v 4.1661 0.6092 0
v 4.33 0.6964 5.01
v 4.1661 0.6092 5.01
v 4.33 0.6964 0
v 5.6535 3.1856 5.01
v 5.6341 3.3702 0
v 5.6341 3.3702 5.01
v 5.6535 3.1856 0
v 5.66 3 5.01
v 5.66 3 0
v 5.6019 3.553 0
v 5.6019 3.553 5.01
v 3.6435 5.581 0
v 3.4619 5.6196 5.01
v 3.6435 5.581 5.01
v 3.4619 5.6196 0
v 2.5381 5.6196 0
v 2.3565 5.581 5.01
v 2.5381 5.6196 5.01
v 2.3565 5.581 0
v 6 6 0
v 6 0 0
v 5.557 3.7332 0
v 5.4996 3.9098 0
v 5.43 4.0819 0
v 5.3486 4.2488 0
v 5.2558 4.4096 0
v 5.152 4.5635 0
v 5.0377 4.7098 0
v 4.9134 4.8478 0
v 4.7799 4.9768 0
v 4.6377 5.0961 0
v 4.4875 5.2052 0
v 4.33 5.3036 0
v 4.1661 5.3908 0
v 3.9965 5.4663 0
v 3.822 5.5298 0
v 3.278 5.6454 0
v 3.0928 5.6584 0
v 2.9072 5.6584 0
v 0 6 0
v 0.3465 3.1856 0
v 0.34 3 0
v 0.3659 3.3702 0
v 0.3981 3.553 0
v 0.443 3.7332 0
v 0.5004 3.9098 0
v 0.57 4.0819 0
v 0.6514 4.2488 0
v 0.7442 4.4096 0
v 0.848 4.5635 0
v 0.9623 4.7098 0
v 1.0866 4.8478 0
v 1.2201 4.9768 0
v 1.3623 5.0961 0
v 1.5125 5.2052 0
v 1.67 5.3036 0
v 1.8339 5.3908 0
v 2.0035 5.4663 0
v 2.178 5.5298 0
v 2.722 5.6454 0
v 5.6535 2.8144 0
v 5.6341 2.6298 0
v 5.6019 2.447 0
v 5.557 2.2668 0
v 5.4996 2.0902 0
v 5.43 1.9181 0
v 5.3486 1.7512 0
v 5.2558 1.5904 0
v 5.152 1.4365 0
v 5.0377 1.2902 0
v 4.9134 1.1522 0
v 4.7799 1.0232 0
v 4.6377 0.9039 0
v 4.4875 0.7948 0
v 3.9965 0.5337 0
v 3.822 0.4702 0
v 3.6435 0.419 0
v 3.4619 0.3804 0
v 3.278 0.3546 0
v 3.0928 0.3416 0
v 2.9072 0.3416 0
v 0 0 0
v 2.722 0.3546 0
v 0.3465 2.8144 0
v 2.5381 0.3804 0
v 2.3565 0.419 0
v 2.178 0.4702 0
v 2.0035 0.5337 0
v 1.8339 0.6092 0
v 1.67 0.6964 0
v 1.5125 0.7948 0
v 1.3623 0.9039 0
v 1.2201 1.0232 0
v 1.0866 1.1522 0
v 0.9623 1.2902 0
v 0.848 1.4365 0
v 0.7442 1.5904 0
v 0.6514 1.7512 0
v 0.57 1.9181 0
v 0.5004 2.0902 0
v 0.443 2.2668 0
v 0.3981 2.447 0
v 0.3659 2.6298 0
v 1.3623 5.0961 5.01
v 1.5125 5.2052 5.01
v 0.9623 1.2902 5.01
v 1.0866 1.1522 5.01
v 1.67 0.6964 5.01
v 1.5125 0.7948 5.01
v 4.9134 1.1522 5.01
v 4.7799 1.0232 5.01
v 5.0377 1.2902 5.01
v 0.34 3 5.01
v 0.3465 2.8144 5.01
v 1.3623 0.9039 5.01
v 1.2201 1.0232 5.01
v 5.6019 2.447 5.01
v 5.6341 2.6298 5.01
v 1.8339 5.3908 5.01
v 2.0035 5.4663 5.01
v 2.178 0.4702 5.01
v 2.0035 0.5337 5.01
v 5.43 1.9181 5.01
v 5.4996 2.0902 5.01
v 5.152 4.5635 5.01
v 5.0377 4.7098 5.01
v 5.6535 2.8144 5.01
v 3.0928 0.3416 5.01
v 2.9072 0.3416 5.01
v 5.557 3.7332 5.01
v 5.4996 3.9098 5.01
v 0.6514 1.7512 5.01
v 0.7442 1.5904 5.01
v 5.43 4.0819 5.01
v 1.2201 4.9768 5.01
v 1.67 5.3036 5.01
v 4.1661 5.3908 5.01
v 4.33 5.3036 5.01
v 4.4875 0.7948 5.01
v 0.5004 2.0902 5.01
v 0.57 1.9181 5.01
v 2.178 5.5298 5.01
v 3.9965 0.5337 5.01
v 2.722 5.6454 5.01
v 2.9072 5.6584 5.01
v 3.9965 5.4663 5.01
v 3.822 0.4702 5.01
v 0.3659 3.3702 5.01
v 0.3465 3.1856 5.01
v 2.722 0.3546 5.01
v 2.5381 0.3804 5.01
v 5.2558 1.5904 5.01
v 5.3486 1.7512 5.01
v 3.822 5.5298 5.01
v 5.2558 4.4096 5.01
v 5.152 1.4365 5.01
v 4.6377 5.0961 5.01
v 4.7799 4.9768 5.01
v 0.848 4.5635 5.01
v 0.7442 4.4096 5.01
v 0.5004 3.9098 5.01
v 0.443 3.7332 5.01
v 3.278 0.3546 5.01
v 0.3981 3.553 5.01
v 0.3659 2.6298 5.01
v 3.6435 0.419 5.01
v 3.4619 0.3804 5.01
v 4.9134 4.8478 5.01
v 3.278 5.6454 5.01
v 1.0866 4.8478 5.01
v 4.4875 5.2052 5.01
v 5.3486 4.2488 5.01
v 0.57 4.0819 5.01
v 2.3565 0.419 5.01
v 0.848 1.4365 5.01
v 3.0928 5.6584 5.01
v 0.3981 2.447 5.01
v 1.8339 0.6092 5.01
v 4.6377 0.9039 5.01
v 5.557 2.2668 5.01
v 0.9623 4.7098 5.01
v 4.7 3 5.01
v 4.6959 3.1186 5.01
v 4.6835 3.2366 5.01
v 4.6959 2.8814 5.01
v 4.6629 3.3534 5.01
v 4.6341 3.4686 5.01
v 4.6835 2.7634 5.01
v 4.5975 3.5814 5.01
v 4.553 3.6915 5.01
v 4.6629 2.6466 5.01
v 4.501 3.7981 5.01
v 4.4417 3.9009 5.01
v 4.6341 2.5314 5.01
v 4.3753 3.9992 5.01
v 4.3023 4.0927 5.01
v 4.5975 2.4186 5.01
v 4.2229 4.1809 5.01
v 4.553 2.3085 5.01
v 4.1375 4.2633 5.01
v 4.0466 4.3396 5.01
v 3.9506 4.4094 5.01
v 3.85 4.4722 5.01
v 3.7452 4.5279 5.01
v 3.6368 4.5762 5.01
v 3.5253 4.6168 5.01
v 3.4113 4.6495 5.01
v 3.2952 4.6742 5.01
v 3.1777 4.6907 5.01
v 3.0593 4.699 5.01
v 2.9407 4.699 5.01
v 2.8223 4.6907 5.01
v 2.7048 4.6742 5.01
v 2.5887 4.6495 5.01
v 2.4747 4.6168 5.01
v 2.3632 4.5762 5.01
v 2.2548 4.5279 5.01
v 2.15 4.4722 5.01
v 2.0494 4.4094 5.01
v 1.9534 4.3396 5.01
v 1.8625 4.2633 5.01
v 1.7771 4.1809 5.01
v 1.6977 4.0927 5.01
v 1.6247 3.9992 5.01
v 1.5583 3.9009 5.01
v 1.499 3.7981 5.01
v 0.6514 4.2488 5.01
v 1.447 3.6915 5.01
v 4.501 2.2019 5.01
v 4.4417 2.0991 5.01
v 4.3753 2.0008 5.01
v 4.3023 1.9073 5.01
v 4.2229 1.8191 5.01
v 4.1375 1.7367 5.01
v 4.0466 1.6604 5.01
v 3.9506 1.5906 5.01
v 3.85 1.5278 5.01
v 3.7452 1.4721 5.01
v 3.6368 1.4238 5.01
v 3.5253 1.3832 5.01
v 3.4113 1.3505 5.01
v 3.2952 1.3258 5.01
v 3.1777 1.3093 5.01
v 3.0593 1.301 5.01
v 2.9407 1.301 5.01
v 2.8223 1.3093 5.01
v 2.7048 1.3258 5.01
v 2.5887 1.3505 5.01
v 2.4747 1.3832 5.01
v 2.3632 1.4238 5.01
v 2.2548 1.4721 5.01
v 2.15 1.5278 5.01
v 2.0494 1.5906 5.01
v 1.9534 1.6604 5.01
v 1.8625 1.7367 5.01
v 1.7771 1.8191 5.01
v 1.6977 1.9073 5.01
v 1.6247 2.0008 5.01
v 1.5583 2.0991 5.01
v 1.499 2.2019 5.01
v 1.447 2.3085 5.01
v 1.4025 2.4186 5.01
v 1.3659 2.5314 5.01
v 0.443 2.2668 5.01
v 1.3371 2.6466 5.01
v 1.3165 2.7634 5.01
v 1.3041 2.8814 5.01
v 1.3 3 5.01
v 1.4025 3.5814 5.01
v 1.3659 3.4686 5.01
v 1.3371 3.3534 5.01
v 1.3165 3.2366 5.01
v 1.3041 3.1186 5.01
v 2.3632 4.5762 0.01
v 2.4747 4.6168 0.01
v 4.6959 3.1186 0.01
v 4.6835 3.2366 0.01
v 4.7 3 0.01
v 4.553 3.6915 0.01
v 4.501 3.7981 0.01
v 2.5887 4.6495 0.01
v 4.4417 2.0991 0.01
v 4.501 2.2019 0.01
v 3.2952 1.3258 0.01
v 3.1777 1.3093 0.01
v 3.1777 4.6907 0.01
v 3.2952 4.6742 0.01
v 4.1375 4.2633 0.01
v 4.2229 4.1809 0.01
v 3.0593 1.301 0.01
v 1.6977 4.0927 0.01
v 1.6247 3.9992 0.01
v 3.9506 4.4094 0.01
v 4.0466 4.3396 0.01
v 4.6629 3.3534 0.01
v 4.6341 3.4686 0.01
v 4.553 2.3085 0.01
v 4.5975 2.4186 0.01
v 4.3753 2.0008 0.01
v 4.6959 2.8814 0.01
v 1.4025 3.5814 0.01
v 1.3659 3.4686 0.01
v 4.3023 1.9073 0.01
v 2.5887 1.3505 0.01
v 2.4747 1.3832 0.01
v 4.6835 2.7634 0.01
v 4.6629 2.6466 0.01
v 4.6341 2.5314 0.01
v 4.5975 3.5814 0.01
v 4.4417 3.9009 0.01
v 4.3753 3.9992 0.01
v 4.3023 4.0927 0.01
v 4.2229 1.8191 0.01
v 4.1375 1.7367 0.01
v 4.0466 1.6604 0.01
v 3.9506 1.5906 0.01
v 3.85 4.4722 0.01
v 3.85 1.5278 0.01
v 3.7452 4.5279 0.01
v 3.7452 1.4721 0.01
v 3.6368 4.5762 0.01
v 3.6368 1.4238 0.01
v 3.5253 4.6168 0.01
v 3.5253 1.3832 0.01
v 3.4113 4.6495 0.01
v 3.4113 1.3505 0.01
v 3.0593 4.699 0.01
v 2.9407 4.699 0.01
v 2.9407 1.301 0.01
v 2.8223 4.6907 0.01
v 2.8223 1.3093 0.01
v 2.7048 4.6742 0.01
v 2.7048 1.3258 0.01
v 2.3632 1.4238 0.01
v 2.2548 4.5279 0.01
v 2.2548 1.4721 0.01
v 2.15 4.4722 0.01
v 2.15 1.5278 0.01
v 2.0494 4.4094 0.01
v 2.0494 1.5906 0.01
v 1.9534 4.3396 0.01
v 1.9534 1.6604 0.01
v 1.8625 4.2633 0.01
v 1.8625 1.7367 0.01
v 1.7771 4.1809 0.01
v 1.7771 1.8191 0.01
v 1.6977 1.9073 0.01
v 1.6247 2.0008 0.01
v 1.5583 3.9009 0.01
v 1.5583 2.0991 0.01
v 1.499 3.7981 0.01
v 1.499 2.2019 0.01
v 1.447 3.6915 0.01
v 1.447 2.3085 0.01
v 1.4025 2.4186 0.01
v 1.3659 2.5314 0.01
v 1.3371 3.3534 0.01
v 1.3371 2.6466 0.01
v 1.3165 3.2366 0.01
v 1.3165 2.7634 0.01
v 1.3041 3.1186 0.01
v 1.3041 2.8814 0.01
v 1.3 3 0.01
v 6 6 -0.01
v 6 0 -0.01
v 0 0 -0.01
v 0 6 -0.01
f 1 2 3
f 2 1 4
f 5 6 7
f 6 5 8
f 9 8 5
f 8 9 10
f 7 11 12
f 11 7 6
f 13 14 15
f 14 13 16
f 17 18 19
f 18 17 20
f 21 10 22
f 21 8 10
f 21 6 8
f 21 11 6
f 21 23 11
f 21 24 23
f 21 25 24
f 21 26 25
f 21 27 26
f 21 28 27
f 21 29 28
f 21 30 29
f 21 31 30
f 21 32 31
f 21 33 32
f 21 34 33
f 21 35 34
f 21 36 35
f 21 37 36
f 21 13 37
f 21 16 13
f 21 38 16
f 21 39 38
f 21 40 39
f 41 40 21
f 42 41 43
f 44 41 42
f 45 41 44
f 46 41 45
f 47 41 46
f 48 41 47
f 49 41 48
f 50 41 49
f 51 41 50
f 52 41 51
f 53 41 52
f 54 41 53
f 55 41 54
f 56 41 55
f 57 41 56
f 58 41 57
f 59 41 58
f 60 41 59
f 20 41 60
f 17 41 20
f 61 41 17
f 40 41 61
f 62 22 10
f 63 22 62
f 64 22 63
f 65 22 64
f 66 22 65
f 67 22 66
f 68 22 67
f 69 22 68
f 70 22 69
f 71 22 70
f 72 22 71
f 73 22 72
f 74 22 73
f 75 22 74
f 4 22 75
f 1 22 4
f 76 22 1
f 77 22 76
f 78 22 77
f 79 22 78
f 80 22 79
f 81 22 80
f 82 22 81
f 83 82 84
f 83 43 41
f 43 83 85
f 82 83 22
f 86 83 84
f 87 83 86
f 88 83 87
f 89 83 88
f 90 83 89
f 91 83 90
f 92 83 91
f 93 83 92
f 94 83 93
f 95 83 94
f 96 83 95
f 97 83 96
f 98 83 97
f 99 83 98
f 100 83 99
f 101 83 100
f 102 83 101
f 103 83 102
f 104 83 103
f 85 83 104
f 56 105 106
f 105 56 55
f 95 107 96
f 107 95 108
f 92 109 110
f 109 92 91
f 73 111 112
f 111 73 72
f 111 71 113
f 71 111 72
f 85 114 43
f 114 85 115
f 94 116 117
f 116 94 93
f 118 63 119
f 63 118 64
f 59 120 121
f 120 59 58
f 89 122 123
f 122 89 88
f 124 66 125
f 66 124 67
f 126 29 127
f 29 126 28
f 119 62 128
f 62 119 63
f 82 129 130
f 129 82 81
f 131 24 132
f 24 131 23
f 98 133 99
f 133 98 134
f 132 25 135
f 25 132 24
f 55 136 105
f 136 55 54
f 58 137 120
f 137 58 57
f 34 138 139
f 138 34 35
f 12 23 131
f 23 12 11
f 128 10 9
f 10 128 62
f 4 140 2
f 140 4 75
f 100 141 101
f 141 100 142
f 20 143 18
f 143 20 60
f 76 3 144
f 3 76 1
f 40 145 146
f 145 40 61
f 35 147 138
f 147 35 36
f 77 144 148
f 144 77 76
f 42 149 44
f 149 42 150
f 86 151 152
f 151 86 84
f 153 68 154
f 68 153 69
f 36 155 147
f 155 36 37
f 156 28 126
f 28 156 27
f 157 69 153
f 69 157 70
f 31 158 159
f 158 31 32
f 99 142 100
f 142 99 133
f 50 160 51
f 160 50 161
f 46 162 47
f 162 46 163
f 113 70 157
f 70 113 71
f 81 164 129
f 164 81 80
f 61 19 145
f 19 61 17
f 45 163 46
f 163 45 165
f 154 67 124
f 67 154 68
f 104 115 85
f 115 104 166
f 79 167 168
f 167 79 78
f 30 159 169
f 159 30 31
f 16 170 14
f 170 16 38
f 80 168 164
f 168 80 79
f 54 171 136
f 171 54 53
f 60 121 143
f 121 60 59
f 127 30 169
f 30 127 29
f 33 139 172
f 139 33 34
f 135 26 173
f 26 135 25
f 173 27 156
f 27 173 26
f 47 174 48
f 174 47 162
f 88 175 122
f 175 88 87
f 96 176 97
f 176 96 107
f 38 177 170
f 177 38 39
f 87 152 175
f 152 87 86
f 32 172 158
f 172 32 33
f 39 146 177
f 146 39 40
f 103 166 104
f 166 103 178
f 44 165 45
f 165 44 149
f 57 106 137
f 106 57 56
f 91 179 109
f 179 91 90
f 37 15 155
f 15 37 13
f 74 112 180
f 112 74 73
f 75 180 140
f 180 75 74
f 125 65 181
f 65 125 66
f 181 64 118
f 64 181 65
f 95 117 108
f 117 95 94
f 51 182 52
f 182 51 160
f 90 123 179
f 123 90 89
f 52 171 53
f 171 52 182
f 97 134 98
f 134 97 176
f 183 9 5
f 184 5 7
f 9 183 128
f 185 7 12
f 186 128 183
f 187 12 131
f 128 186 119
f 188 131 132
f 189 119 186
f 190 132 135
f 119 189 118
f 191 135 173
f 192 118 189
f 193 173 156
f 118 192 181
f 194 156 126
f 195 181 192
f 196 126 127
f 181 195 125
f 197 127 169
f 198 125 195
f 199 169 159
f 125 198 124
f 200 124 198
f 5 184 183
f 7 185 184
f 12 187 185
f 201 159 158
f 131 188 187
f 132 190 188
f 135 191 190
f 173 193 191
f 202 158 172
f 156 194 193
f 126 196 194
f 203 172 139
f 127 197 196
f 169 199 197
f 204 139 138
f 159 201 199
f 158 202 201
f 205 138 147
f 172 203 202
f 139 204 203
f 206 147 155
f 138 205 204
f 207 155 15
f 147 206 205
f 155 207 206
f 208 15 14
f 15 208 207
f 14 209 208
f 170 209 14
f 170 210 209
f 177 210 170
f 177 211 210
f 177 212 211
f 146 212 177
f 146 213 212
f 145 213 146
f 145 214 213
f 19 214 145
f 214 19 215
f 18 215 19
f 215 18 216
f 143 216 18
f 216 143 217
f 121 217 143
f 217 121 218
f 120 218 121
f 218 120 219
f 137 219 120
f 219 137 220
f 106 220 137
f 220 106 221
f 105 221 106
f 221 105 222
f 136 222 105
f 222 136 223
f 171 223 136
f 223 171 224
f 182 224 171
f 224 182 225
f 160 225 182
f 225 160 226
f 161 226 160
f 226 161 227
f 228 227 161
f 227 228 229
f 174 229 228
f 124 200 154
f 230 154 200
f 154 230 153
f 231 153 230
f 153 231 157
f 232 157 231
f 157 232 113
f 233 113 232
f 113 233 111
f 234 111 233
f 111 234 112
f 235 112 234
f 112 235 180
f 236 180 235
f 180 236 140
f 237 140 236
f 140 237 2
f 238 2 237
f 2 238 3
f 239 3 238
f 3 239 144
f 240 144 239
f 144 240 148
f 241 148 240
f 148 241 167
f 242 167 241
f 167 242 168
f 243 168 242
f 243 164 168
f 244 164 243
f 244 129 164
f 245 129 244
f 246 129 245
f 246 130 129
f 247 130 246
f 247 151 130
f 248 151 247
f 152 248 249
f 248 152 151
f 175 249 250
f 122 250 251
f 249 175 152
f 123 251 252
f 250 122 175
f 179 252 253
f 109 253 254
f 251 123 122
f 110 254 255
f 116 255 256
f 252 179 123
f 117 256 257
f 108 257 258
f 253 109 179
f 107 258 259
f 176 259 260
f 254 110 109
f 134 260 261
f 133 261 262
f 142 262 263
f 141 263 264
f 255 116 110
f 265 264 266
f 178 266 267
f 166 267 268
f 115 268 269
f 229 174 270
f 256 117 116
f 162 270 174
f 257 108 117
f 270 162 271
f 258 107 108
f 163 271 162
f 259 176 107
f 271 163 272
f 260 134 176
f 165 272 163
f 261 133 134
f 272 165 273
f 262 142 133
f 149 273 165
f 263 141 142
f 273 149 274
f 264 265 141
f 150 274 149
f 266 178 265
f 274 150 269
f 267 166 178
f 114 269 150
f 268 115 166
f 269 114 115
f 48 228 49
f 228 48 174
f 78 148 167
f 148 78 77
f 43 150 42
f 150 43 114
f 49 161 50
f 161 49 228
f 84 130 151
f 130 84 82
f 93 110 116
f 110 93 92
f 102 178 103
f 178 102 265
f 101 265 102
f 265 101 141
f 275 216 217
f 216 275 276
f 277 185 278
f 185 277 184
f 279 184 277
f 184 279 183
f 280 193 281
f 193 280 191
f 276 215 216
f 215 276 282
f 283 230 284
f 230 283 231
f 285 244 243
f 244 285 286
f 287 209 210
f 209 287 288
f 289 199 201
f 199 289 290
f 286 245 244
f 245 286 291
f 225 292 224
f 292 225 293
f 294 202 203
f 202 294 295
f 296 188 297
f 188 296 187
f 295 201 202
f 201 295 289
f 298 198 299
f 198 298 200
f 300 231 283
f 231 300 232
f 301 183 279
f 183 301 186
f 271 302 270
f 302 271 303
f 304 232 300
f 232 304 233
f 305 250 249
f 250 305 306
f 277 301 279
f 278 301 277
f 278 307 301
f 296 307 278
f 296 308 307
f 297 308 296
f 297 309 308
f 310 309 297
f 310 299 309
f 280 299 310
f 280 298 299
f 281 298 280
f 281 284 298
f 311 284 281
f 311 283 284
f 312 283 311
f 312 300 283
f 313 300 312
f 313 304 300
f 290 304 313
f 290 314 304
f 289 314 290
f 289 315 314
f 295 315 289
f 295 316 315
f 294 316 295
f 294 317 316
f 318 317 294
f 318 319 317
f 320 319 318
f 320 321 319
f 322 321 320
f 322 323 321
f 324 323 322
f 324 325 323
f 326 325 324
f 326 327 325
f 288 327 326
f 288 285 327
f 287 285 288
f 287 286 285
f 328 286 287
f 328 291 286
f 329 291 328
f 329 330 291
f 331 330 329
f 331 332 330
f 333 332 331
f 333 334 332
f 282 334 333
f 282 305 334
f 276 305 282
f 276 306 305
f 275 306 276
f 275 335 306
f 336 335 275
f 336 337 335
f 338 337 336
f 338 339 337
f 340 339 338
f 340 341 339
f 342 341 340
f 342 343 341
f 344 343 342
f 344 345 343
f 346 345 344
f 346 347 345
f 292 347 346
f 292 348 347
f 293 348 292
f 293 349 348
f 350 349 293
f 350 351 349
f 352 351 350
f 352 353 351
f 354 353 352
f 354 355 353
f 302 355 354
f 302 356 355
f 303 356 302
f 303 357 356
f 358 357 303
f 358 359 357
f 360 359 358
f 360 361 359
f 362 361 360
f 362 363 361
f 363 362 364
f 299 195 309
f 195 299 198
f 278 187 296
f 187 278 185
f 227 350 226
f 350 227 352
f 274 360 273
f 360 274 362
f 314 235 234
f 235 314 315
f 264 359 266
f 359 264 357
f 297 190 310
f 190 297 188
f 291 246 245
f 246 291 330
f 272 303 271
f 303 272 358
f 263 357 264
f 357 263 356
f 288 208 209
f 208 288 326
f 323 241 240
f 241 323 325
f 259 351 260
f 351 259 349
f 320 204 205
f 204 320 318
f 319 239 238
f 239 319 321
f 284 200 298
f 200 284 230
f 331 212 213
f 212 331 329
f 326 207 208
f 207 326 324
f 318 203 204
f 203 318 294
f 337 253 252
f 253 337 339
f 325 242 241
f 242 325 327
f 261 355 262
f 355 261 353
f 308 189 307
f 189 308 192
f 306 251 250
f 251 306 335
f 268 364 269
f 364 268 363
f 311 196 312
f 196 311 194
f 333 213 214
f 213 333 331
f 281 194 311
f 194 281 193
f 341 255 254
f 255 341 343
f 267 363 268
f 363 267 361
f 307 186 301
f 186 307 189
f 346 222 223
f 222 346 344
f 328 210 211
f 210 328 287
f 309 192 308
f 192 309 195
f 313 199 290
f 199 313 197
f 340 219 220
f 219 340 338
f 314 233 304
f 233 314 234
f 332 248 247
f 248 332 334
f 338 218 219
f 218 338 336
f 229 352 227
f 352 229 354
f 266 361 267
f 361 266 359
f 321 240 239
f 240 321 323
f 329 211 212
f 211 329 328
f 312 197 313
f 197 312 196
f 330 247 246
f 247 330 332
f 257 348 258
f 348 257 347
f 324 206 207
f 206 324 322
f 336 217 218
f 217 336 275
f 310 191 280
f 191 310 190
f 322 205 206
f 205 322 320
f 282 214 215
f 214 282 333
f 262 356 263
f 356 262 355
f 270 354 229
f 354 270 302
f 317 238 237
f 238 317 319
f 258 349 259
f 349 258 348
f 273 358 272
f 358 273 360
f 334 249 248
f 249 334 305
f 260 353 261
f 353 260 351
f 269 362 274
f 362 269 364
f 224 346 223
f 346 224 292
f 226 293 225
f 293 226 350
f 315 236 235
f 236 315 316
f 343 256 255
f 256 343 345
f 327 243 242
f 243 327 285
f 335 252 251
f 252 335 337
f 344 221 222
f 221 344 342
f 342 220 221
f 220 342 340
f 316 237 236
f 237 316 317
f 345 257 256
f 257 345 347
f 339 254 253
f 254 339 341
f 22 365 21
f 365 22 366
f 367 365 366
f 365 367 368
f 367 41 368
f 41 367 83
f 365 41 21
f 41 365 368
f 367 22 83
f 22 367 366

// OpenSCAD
// file: ../Base/PlacementOptions.scad
// Fischertechnik Box Foundation
// Placement Options

// Alignment
NoAlign = 0;
AlignLeft = 1;
AlignBottom = 2;
AlignCenter = 3;
AlignRight = 4;
AlignTop = 5;

// Element rotation degree steps
rotations = [0, -90, -180, -270];

// Rotation
NoRotation = 0;
Rotate0 = 0;
Rotate90 = 1;
Rotate180 = 2;
Rotate270 = 3;

// Docking (seen from above)
NoDock = -1;
DockLeft = 0;
DockTop = 1;
DockRight = 2;
DockCorner = 2;
DockBottom = 3;

// Web corners
LowerLeft = 0;
UpperLeft = 1;
UpperRight = 2;
LowerRight = 3;

// Web position relative to corner
LeftOfCorner = 0;
RightOfCorner = 1;
// file: ../Base/Boxes.scad
// Fischertechnik Box Foundation
// Pre-designed Boxes

use <Constants.scad>

include <PlacementOptions.scad>

box190Width = 190;
box190Depth = 130;
box130Width = 130;
box130Depth = 95;

// Values are from an original ec3 box
topBottomDifference = 1.5;
outerHeight = 40;
baseThickness = 1.8;
innerHeight = outerHeight - baseThickness;
stackExcess = 5.7;
radius = 3.5;
wallThickness = 1.5;
tolerance = 0.2;

boxWallThickness = wallThickness;
boxBaseThickness = baseThickness;
boxWebWidth = 3.0;

// getBoxWallThickness()
// Gets the wall thickness of a Fischertechnik Box
function getBoxWallThickness() = boxWallThickness;

// getBoxUsageHeight(height = 38.2)
// Gets the usable height of a Fischertechnik box
// height = Outer height of the box from the bottom to the upper edge.
function getBoxUsageHeight(height = outerHeight) = height - baseThickness - stackExcess;

// getBoxInnerHeight()
// Gets the inner height of a Fischertechnik box, including the stack excess
function getBoxInnerHeight() = innerHeight;

// getBoxBaseThickness()
// Gets the thickness of the Fischertechnik box base.
function getBoxBaseThickness() = boxBaseThickness;

// getBoxWebWidth()
// Gets the width of a box web
function getBoxWebWidth() = boxWebWidth;

// getBox190Space()
// Gets the usable inner space of a Box 190 as an x/y-list
function getBox190Space() = [
    box190Width - 2*getBoxWallThickness() - topBottomDifference, 
    box190Depth - 2*getBoxWallThickness() - topBottomDifference ];

// RoundedCornerPlate(width, depth, height, radius)
// Creates a body plate with rounded corners for a box. Used
// also to create the complete box with the hull module.
// width = Width of the plate
// depth = depth of the plate 
// height = thickness of the plate
// radius = radius of the rounded corner
module RoundedCornerPlate(width, depth, height, radius) {
    translate([radius, radius])
    hull() {
        w = width-2*radius;
        d = depth-2*radius;
        cube([w, d, height]);
        cylinder(height, r=radius, $fn=getFragments());
        translate([w, 0])
            cylinder(height, r=radius, $fn=getFragments());
        translate([w, d])
            cylinder(height, r=radius, $fn=getFragments());
        translate([0, d])
            cylinder(height, r=radius, $fn=getFragments());
    }
}

// BoxBase(width, depth)
// Creates an empty stackable Fischertechnik compatible box
// width = Outer width of the box (190, 130, ...)
// depth = Outer depth of the box (130, 95, ...)

module BoxBase(width, depth, height=outerHeight) {    
    thinPlate = 0.01;

    innerHeight = height - baseThickness;    
    
    module Body(tolerance=tolerance) {
        hull() {
            // Bottom with tolerance to fit into the original boxes when stacked
            translate([-wallThickness+tolerance, -wallThickness+tolerance, -baseThickness])
                RoundedCornerPlate(width-topBottomDifference-2*tolerance, depth-topBottomDifference-2*tolerance, thinPlate, radius);
            
            // Top
            translate([-wallThickness-topBottomDifference/2, -wallThickness-topBottomDifference/2, innerHeight-thinPlate])
                RoundedCornerPlate(width, depth, thinPlate, radius);
         }
    }

    module Cutoff() {
        hull() {
            coWidth = width - 2*wallThickness;
            coDepth = depth - 2*wallThickness;
            
            // Bottom
            RoundedCornerPlate(coWidth-topBottomDifference, coDepth-topBottomDifference, thinPlate, radius);

            // Top
            translate([-topBottomDifference/2, -topBottomDifference/2, innerHeight+thinPlate]) 
                RoundedCornerPlate(coWidth, coDepth, thinPlate, radius);
        }
    }
    
    difference() {        
        Body();
        Cutoff();
        stackOffset = innerHeight - stackExcess;
        translate([0, 0, stackOffset + baseThickness])
            Body(tolerance=0);
    }
}

// Creates the Fischertechnik empty box 130x190 mm and places it at position 0,0
// 190x130 are the outer sizes, the inner space is slightly smaller. Use getBox190Space() to get the inner sizes.
// The box is positioned that the usable inner space is at the 0,0,0 position.

module Box190() {
    BoxBase(box190Width, box190Depth);
}

// Gets the usable inner space of a Box 130 as an x/y-list
function getBox130Space() = [
    box130Width - 2*getBoxWallThickness() - topBottomDifference, 
    box130Depth - 2*getBoxWallThickness() - topBottomDifference ];

// Creates the Fischertechnik empty box 95x130 mm and places it at position 0,0
// 190x130 are the outer sizes, the inner space is slightly smaller. Use getBox190Space() to get the inner sizes.
// The box is positioned that the usable inner space is at the 0,0,0 position.

module Box130() {
    BoxBase(box130Width, box130Depth);
}

// Creates a web at the specified box walls
// corner 0 = LowerLeft, 1 = UpperLeft, 2 = UpperRight, 3 = LowerRight
// side 0 = LeftOfCorner, 1 = RightOfCorner
// distance = Distance in mm from the corner
// boxSpace = inner width and depth of the box (default: Box 190)
// webWidth = length of the web (default is 3 mms)
// webThickness = thickness of the web (default is 1 mm)
// height = Height of the web (standard is getBoxUsageHeight())
// sink = How much of the web is sunk into the wall

module BoxWeb(
    corner, 
    side, 
    distance, 
    boxSpace=getBox190Space(), 
    webWidth=getBoxWebWidth(), 
    webThickness=1.0, 
    height=getBoxUsageHeight(),
    sink = getBoxWallThickness()/2) {
    width = (corner % 2 == 0) ? 
            (side == LeftOfCorner ? webWidth : webThickness) :
            (side == LeftOfCorner ? webThickness : webWidth);

    depth = (corner % 2 == 0) ? 
            (side == RightOfCorner ? webWidth : webThickness) :
            (side == RightOfCorner ? webThickness : webWidth);
    
    xDiff = corner == LowerLeft ? 
                (side == LeftOfCorner ? -sink : distance) :
            (corner == UpperLeft ?                
                (side == LeftOfCorner ? distance : -sink) :
            (corner == UpperRight ?
                (side == LeftOfCorner ? boxSpace.x-webWidth+sink : boxSpace.x-distance-webThickness) :
                (side == LeftOfCorner ? boxSpace.x-distance-webThickness: boxSpace.x-webWidth+sink)));

    yDiff = corner == LowerLeft ? 
                (side == RightOfCorner ? -sink : distance) :
            (corner == UpperLeft ?
                (side == RightOfCorner ? boxSpace.y-distance-webThickness : boxSpace.y-webWidth+sink) :
            (corner == UpperRight ?
                (side == RightOfCorner ? boxSpace.y-webWidth+sink : boxSpace.y-distance-webThickness) :
                (side == RightOfCorner ? distance : -sink)));
    
    translate([xDiff, yDiff, -getExcess()])
        cube([width, depth, height + 2*getExcess()]);
}
// file: ../Base/Rotation.scad
// Fischertechnik Box Foundation
// Geometry Helpers Rotation

include <PlacementOptions.scad>

// getRotatedSpace(space, rotation=NoRotation)
// Rotates the space dependent on the specified rotation

function getRotatedSpace(space, rotation=NoRotation) = [
    (rotation == Rotate90 || rotation == Rotate270) ? space.y : space.x,
    (rotation == Rotate90 || rotation == Rotate270) ? space.x : space.y
];

// Rotates the given space around the fixed left lower corner
// space = the space the children needs as width/depth list [width,depth]
// rotation = 0 Rotate0 degrees, 1 Rotate90 degrees, 2 Rotate180 degrees, 3 Rotate270 degrees (equivalent to -90)

module RotateFix(space, rotation=NoRotation) {
    dy = (rotation == Rotate0 || rotation == Rotate270) ? 0 :
        (rotation == Rotate90) ? space.x :
        space.y;
    dx = (rotation < Rotate180) ? 0 :
        (rotation == Rotate180) ? space.x :
        space.y;
    
    translate([dx, dy, 0])
        rotate([0, 0, rotations[rotation]])
            children();
}
// file: ../Base/Alignment.scad
// Fischertechnik Box Foundation
// Geometry Helpers Alignment

include <PlacementOptions.scad>

// getAlignedX(elementWidth, spaceWidth, align=AlignRight, offset=0)
// Gets the aligned X offset of an element with the given
// width in the given space.
// elementWidth = The width of the element to positon
// spaceWidth = The space where the element should be aligned
// align = 0 AlignLeft, 1 AlignCenter, 2 AlignRight
// offset = an optional offset from the aligned position. When
// aligned left or centered, then positive values are in X direction.
// When aligned right then positive values are in negative X direction.

function getAlignedX(elementWidth, spaceWidth, align=AlignRight, offset=0) =
    (align == AlignLeft) ?
        offset :
        ((align == AlignCenter) ?
        (spaceWidth - elementWidth)/2 + offset :
        spaceWidth - offset - elementWidth);

// getAlignedY(elementDepth, spaceDepth, align=AlignTop, offset=0)
// Gets the aligned Y offset of an element with the given
// depth in the given space.
// elementDepth = The depth of the element to positon
// spaceDepth = The space where the element should be aligned
// align = 0 AlignBottom, 1 AlignCenter, 2 AlignTop
// offset = an optional offset from the aligned position. When
// aligned bottom or centered, then positive values are in Y direction.
// When aligned top then positive values are in negative Y direction.

function getAlignedY(elementDepth, spaceDepth, align=AlignTop, offset=0) =
    (align == AlignBottom) ?
        offset :
        ((align == AlignCenter) ?
        (spaceDepth - elementDepth)/2 + offset :
        spaceDepth - offset - elementDepth);
// file: ../Base/Placement.scad
// Fischertechnik Box Foundation
// Geometry Helpers Placement

use <Constants.scad>
use <Alignment.scad>
use <Rotation.scad>
use <Boxes.scad>

include <PlacementOptions.scad>

// Place(x=0, y=0, elementSpace=[0,0], alignX=AlignLeft, alignY=AlignBottom, rotation=Rotate0, boxSpace=getBox190Space())
// Places the child at the specified position
// y = Y-Position. This is a relative position when an X aligment is specified.
// x = X-Position. This is a relative position when an Y aligment is specified.
// elementSpace = space of the element to be placed [x,y]
// alignX = -1=NoAlign, 0 AlignLeft, 1 AlignCenter, 3 AlignRight (elementSpace and boxSpace required!)
// alignY = -1=NoAlign, 2 AlignBottom, 1 AlignCenter, 4 AlignTop (elementSpace and boxSpace required!)
// rotation = 0 Rotate0 0 degrees, 1 Rotate90 90 degrees, 
// 2 Rotate180 180 degrees, 3 Rotate270 270 degrees (equivalent to -90)
// boxSpace = Inner space of the box where the placement occurs [x,y] - default is Box 190x130 inner space

module Place(x=0, y=0, elementSpace=[0,0], 
  alignX=AlignLeft, alignY=AlignBottom, 
  rotation=NoRotation, boxSpace=getBox190Space()) {

    module Position(x, y, space, rotation=Rotate0) {
        translate([x, y, 0])
            RotateFix(space, rotation)
                children();
    }

    space = getRotatedSpace(elementSpace, rotation);
    alignedX = getAlignedX(space.x, boxSpace.x, alignX, x);
    alignedY = getAlignedY(space.y, boxSpace.y, alignY, y);
    Position(alignedX, alignedY, elementSpace, rotation)
        children();
}

// Center(space=getBox130Space(), elementSpace=[0,0])
// space = Space where the children is centered. For cylinder use centered=true and no elementSpace.
// elementSpace = space of the element to be centered [x,y]

module Center(space=getBox190Space(), elementSpace=[0,0]) {
    Place(elementSpace=elementSpace, boxSpace=space, alignX=AlignCenter, alignY=AlignCenter)
        children();
}

// CenterHorizontal(width=0, y=0, offset=0, space=getBox130Space())
// width = Width of the element to be placed.
// y = Y position of the element
// offset = Offset from the center position (negative will be left of the center)
// space = Space where the element is placed

module CenterHorizontal(width=0, y=0, offset=0, space=getBox190Space()) {
    Place(x=offset, y=y, elementSpace=[width, 0], boxSpace=space, alignX=AlignCenter)
        children(0);
}

// CenterVertical(depth=0, x=0, offset=0, space=getBox130Space())
// depth = Depth of the element to be placed.
// x = X position of the element
// offset = Offset from the center position (negative will be down of the center)
// space = Space where the element is placed

module CenterVertical(depth=0, x=0, offset=0, space=getBox190Space()) {
    Place(x=x, y=offset, elementSpace=[0, depth], boxSpace=space, alignY=AlignCenter)
        children(0);
}

// getIsVertical(align)
// True if the specified alignment needs a vertical orientation for a divider (AlignRight, AlignLeft)

function getIsVertical(align) = (align == AlignRight || align == AlignLeft);

// getIsHorizontal(align)
// True if the specified alignment needs a horizontal orientation for a divider (AlignTop, AlignBottom)

function getIsHorizontal(align) = (align == AlignTop || align == AlignBottom);
// file: ../Base/Constants.scad
// Fischertechnik Box Foundation
// Constants

// Constant values necessary for multiple elements

// Base constants
dividerThickness = 1.2;
excess = 0.01;
fragments = 90;
tolerance = 0.8;

// Gets the thickness of a divider 
function getDividerThickness() = dividerThickness;

// Gets the excess that is used to merge walls into each other
function getExcess() = excess;

// Gets amount of fragments of a cylinder
function getFragments() = fragments;

// Gets the inner tolerance of a frame to each side
function getTolerance() = tolerance;


// Fischertechnik specific constants
axisDiameter = 4;
axisBottomDiameter = axisDiameter + 1;
axisTolerance = 0.2;

// Gets axis diameter of Fischertechnik axis
function getAxisDiameter() = axisDiameter;

// Gets axis diameter tolerance (subtracted for element axis)
function getAxisTolerance() = axisTolerance;

// Gets the axis diameter for standing axis
function getStandAxisDiameter() = getAxisDiameter() - getAxisTolerance();

// Gets axis bottom diameter for thicker part at the bottom
function getAxisBottomDiameter() = axisBottomDiameter;

pinHeight = 2.5;

// gets the height of a connecting pin
function getPinHeight() = pinHeight;

standardEdgeDistance = 2.5;
standardWebDistance = 11.5;
standardCornerLength = 15;

// gets the standard distance to the wall of the box for dockable frames with webs
function getStandardEdgeDistance() = standardEdgeDistance;

// gets the standard distance of each web to the corner of the dockable frame
function getStandardWebDistance() = standardWebDistance;

// gets the standard length of the corner walls of a dockable frame
function getStandardCornerLength() = standardCornerLength;

tubeWallFactor = 0.8;

// gets the wall thickness of a tube.
function getTubeWallThickness() = tubeWallFactor * getDividerThickness();

smallPartsFrameHeight = 20;

// gets the frame height for docked small parts boxes.
function getSmallPartsFrameHeight() = smallPartsFrameHeight;

hubRingDiameter = 19.5;
hubRingLevelDiameter = 21;

// gets the diameter of a tube matching the inner ring of a wheel
function getHubRingDiameter() = hubRingDiameter;

// gets the diameter of a hub tube with a thicker diameter
function getHubRingLevelDiameter() = hubRingLevelDiameter;
// main file
// Fischertechnik Box Library
// Cylinder for clip contact
// 31338

use <../Base/Constants.scad>
use <../Base/Placement.scad>
use <../ModelBase/Simple.scad>
use <../ModelBase/Complex.scad>

/* [Hidden] */
width = 6;
depth = 6;
height = 5;

// getCylinderClipContactSpace()
// Gets the space the cylinder for clip contact needs

function getCylinderClipContactSpace() = [width, depth, height];

// CylinderClipContact()
// Standing cylinder for clip contact (as in mini-mot 1)
// 31338

module CylinderClipContact() {
    Space(getCylinderClipContactSpace());
    
    innerDiameter = 3.4;
    Center(getCylinderClipContactSpace())
        Tube(height, innerDiameter=innerDiameter);
}

// Tests
color("lightgray")
CylinderClipContact();
